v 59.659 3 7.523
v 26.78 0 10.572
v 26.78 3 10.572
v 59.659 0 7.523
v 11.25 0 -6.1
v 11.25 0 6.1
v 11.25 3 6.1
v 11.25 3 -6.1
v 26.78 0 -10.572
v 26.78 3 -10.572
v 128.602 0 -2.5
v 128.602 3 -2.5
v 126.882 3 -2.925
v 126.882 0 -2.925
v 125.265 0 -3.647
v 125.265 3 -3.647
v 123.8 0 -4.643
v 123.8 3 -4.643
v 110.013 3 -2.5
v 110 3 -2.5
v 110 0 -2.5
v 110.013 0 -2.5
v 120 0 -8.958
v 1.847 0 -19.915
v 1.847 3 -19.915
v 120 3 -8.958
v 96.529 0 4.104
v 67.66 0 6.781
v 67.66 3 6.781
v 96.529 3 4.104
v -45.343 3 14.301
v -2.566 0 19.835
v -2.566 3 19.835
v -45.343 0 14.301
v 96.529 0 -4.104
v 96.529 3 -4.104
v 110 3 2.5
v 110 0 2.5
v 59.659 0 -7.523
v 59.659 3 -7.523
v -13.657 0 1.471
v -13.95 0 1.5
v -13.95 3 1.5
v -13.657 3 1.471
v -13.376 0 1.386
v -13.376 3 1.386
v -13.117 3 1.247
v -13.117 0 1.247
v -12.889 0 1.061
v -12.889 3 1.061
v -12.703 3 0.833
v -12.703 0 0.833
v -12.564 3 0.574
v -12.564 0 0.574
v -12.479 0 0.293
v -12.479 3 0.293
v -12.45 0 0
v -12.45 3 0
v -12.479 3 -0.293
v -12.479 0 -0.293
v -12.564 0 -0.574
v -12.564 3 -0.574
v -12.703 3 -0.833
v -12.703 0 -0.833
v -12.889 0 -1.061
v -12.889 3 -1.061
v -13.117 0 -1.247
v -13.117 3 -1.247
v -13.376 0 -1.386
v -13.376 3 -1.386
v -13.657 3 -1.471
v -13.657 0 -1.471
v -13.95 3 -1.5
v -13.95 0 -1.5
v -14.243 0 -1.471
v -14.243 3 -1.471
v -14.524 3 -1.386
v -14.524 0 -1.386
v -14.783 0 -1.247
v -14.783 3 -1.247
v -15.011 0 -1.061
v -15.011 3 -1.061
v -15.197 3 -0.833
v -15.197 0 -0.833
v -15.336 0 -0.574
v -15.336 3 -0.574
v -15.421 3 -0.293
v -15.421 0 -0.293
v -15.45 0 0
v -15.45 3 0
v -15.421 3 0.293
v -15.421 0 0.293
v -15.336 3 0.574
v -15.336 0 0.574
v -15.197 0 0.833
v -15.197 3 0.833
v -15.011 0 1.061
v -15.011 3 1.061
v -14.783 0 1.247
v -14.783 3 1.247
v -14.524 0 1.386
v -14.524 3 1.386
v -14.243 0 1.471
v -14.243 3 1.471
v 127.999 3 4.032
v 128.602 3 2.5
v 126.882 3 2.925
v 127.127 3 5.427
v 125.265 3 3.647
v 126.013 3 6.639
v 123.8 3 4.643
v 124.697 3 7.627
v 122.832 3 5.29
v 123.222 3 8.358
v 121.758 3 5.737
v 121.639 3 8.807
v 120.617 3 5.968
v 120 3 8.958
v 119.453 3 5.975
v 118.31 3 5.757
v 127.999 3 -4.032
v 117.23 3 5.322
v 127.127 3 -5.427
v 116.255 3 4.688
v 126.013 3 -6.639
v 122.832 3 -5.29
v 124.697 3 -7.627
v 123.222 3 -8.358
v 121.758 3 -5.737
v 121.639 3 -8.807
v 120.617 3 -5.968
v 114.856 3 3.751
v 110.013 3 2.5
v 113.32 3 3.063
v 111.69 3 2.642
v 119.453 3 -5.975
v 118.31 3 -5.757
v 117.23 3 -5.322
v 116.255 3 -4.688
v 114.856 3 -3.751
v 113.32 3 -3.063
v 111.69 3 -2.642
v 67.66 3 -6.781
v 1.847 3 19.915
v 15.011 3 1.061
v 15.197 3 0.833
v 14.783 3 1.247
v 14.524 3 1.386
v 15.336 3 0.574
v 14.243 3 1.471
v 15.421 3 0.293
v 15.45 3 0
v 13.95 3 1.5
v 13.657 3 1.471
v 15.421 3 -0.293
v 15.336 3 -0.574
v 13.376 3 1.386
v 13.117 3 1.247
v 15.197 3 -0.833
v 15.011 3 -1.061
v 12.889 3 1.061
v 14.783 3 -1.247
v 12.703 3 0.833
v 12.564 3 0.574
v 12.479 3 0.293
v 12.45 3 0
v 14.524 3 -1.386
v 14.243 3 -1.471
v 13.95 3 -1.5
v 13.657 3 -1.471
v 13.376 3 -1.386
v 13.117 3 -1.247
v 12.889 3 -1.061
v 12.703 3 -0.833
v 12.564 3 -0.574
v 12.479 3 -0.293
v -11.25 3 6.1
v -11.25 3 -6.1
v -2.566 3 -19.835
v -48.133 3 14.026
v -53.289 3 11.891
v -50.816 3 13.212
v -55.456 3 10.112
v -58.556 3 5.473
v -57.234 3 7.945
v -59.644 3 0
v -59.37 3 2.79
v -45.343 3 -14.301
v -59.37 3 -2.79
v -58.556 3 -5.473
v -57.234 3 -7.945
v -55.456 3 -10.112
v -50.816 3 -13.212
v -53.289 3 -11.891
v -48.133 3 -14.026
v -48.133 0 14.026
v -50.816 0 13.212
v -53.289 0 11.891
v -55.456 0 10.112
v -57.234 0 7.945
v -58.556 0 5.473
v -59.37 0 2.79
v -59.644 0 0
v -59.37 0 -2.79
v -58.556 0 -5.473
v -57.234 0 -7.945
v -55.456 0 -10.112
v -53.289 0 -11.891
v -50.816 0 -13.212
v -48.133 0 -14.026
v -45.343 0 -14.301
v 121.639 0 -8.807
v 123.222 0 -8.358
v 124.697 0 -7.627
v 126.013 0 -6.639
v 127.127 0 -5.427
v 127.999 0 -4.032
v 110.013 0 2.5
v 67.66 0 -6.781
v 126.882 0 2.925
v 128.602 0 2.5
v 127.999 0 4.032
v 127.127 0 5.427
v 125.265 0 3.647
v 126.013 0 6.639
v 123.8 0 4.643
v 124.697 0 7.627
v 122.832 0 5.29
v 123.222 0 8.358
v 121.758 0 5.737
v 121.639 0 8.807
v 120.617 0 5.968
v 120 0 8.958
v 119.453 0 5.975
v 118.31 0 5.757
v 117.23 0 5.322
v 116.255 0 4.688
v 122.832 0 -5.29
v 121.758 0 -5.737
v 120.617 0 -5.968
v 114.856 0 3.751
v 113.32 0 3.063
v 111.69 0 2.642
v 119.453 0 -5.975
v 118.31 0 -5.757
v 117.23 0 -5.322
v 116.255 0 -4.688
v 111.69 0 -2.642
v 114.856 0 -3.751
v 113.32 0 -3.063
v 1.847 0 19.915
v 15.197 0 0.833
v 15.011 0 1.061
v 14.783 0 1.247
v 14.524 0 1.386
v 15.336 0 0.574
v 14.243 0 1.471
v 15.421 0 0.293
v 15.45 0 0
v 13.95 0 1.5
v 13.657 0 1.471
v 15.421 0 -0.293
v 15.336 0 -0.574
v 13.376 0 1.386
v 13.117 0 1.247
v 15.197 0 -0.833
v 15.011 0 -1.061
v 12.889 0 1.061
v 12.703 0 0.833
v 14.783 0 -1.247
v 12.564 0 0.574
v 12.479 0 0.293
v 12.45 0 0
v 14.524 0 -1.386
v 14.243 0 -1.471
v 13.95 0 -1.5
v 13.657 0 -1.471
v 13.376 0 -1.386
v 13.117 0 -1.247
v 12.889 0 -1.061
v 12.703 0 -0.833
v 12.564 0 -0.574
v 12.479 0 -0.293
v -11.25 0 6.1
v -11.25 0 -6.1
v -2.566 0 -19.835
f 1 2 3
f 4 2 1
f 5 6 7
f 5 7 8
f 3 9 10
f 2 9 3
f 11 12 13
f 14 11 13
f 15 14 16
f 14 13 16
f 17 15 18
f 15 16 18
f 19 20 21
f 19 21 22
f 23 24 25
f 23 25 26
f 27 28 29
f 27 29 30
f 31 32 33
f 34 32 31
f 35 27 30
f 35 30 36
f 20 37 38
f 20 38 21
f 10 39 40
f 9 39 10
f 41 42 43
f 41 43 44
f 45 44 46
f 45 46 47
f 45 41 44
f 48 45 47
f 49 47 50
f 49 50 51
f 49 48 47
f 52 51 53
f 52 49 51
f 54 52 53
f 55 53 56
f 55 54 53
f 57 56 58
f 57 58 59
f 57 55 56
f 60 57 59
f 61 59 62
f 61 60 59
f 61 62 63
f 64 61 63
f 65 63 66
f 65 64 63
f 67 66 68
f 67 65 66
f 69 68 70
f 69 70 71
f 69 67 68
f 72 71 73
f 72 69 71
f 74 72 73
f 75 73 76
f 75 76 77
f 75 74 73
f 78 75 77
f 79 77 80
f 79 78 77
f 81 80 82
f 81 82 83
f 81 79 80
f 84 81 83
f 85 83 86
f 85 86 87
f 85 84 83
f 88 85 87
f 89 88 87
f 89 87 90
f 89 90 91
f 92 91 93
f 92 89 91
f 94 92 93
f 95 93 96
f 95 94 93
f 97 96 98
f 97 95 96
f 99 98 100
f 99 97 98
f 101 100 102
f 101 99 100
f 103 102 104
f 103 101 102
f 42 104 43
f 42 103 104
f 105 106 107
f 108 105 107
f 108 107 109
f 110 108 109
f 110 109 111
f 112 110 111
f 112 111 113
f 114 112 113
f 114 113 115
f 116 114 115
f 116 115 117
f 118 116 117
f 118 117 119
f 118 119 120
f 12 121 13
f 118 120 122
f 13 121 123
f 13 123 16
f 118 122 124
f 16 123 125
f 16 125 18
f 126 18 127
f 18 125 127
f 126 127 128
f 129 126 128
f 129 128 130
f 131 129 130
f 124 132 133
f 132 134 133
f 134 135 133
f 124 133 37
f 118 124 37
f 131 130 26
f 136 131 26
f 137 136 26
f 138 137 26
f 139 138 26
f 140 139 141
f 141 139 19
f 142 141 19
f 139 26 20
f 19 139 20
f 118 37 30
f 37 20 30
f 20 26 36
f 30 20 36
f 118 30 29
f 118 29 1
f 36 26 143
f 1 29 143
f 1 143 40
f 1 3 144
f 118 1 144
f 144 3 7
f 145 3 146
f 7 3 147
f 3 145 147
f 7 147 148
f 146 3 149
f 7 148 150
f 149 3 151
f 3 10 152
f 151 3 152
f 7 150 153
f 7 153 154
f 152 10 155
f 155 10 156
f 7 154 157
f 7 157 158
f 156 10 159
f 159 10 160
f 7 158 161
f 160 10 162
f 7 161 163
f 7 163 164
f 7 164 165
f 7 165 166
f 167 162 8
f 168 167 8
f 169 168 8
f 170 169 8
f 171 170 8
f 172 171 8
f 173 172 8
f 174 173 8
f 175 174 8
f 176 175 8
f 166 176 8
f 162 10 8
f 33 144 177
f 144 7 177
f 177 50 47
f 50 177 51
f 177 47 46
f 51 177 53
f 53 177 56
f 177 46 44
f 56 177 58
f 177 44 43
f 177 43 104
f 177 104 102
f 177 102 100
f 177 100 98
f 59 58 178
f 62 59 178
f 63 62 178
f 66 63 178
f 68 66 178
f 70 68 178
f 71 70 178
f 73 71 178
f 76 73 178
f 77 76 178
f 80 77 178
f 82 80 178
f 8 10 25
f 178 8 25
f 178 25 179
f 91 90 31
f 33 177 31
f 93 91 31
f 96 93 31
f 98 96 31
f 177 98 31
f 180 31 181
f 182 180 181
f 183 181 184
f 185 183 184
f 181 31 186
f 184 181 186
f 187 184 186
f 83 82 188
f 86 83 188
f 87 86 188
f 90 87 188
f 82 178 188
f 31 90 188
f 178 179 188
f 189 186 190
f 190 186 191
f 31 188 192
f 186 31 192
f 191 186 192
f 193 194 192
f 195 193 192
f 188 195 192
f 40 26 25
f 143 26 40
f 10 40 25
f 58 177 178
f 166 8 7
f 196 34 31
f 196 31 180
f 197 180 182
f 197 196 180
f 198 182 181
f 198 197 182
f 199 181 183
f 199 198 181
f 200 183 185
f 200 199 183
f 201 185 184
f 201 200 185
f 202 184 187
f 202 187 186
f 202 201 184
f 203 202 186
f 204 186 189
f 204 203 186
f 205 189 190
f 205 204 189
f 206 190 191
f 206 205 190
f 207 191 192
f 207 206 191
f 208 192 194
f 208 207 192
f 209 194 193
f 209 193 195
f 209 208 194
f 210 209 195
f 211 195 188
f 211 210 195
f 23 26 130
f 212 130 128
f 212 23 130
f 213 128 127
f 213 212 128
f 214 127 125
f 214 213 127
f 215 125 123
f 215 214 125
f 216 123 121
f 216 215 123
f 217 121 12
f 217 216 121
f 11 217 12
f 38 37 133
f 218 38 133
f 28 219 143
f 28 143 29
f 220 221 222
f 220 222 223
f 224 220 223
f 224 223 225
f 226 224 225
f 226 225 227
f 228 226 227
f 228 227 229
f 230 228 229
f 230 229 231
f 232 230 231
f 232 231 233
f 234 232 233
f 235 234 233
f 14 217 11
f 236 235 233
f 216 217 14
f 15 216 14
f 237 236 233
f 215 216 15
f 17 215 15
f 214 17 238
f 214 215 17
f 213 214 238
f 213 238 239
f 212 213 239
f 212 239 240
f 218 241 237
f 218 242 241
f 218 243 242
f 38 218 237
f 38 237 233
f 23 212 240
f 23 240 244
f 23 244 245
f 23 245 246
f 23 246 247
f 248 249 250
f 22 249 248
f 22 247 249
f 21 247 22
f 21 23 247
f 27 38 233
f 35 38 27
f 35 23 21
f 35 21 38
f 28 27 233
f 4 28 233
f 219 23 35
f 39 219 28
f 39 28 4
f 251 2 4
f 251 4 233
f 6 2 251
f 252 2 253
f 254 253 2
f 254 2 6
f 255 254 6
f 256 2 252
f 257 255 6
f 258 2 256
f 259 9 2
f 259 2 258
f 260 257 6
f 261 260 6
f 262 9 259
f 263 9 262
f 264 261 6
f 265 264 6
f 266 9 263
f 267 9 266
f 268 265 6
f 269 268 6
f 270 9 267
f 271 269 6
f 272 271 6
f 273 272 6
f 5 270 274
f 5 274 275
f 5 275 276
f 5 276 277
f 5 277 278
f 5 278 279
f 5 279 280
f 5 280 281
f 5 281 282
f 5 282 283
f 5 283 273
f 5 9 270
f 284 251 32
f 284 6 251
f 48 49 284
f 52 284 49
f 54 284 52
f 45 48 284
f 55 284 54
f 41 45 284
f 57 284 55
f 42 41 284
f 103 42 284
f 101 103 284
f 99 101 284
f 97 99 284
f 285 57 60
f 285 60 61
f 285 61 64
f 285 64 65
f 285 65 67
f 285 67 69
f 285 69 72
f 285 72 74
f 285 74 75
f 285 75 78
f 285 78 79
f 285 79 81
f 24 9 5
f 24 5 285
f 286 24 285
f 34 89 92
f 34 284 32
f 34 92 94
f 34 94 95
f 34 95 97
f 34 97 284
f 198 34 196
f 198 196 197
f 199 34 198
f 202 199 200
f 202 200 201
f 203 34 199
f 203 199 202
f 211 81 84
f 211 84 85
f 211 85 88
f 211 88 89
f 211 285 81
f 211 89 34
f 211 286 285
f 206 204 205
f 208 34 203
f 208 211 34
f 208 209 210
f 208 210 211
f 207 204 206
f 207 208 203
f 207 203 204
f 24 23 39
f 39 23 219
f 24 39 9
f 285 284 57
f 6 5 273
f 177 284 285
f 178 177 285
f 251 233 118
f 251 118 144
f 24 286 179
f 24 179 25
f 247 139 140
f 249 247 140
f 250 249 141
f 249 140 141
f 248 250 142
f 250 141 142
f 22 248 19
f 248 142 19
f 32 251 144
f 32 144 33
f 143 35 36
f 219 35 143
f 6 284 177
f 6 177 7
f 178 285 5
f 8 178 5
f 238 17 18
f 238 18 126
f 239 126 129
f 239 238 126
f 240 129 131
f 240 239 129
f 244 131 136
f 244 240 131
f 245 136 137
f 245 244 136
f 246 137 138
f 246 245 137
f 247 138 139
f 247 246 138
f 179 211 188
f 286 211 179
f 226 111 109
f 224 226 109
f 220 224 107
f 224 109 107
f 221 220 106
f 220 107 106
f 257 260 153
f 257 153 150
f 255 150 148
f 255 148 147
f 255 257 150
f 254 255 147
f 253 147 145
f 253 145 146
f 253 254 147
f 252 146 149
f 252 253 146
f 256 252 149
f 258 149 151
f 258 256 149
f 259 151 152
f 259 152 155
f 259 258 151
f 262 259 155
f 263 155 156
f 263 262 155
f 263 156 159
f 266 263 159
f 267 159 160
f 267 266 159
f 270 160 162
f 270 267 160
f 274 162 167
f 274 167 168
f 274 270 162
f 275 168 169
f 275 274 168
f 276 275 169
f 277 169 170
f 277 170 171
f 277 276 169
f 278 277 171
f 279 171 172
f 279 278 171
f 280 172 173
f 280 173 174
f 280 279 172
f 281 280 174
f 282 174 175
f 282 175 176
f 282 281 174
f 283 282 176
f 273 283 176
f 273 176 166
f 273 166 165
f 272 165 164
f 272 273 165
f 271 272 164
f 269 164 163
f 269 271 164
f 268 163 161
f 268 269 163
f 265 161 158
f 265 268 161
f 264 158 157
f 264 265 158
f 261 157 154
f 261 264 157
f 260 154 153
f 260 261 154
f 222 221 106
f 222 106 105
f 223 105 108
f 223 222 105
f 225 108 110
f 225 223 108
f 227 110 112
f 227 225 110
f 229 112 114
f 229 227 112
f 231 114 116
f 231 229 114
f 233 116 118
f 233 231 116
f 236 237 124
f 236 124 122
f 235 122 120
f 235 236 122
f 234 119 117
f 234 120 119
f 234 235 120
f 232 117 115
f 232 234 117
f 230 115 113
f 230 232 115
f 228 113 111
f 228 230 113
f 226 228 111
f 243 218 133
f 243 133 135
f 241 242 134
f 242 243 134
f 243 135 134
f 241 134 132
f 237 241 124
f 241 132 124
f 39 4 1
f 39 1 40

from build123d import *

# Parameters (mm, degrees)
SKETCH1_R           = 1.5
SKETCH1_R_2         = 6
SKETCH1_W           = 22.5
SKETCH1_H           = 12.2
BOSS_EXTRUDE1_DEPTH = 3
SKETCH3_W           = 20
SKETCH3_H           = 5
CUT_EXTRUDE1_DEPTH  = 131.520857309
FILLET1_R           = 10


with BuildPart() as part:
    # Sketch1 → Boss-Extrude1 (new body)
    with BuildSketch(Plane(origin=(0, 0, 0), x_dir=(1, 0, 0), z_dir=(0, 1, 0))):
        with BuildLine():
            Line((1.846751087, 19.91455524), (120, 8.957763171))
            ThreePointArc((120, 8.957763171), (128.957763171, 0), (120, -8.957763171))
            Line((120, -8.957763171), (1.846751087, -19.91455524))
            Line((1.846751087, -19.91455524), (-2.565887989, -19.834722555))
            Line((-2.565887989, -19.834722555), (-45.343490518, -14.300864634))
            ThreePointArc((-45.343490518, -14.300864634), (-59.644355152, 0), (-45.343490518, 14.300864634))
            Line((-45.343490518, 14.300864634), (-2.565887989, 19.834722555))
            Line((-2.565887989, 19.834722555), (1.846751087, 19.91455524))
        make_face()
        with Locations(Location((13.95, 0, 0), (0, 0, 270))):
            Circle(SKETCH1_R, mode=Mode.SUBTRACT)
        with Locations(Location((-13.95, 0, 0), (0, 0, 270))):
            Circle(SKETCH1_R, mode=Mode.SUBTRACT)
        with Locations(Location((120, 0, 0), (0, 0, 270))):
            Circle(SKETCH1_R_2, mode=Mode.SUBTRACT)
        Rectangle(SKETCH1_W, SKETCH1_H, mode=Mode.SUBTRACT)
        Polygon((96.529167285, 4.104267173), (67.660347399, 6.781380665), (67.660347399, -6.781380665), (96.529167285, -4.104267173), align=None, mode=Mode.SUBTRACT)
        Polygon((59.65913304, 7.523363157), (26.779600723, 10.572404992), (26.779600723, -10.572404992), (59.65913304, -7.523363157), align=None, mode=Mode.SUBTRACT)
    extrude(amount=BOSS_EXTRUDE1_DEPTH)

    # Sketch3 → Cut-Extrude1 (cut, through all)
    with BuildSketch(Plane(origin=(0, 3, 0), x_dir=(1, 0, 0), z_dir=(0, 1, 0))):
        with Locations((120, 0)):
            Rectangle(SKETCH3_W, SKETCH3_H)
    extrude(amount=-CUT_EXTRUDE1_DEPTH, mode=Mode.SUBTRACT)

    # Fillet1
    # the kernel refuses this fillet: 10 mm, written as the material it takes off along each edge
    with BuildSketch(Plane(origin=(125.454356057, 10.868690914, 2.5), x_dir=(1, 0, 0), z_dir=(0, -1, 0))) as fillet1_piece_1:
        with BuildLine():
            CenterArc((4.679032278, 9.882020871), FILLET1_R, 230.703265247, 30.48689252)
            Line((-1.654335431, 2.143257826), (-1.781002786, 1.988482566))
            ThreePointArc((-1.781002786, 1.988482566), (-0.863019038, 1.043956035), (-0.181811869, -0.083333333))
            Line((-0.181811869, -0.083333333), (0, -0.2))
            ThreePointArc((0, -0.2), (1.573738183, -0.2), (3.116845247, -0.197640417))
            Line((3.116845247, -0.197640417), (3.147476366, 0))
        make_face()
    extrude(amount=18.737381828, mode=Mode.SUBTRACT)
    with BuildSketch(Plane(origin=(114.545643943, 14.332840301, 2.5), x_dir=(0.6156579371182371, 0, 0.7880135179445317), z_dir=(0, -1, 0))) as fillet1_piece_2:
        with BuildLine():
            CenterArc((5.089273947, 9.728751913), FILLET1_R, 217.99974274, 38.624832873)
            Line((-2.790861233, 3.572172542), (-2.948463936, 3.449040954))
            Line((-2.948463936, 3.449040954), (-0.157602704, -0.123131587))
            Line((-0.157602704, -0.123131587), (0.046266127, -0.194575038))
            ThreePointArc((0.046266127, -0.194575038), (1.387983804, -0.037251148), (2.729701481, -0.194575038))
            Line((2.729701481, -0.194575038), (2.775967607, 0))
        make_face()
    extrude(amount=25.665680602, mode=Mode.SUBTRACT)
    with BuildSketch(Plane(origin=(114.545643943, 14.332840301, -2.5), x_dir=(-1, 0, 0), z_dir=(0, -1, 0))) as fillet1_piece_3:
        with BuildLine():
            CenterArc((4.53313612, 10), FILLET1_R, 231.375167127, 38.624832873)
            Line((-1.709046491, 2.1875), (-1.833890143, 2.03125))
            ThreePointArc((-1.833890143, 2.03125), (-0.883877653, 1.070816035), (-0.181811869, -0.083333333))
            Line((-0.181811869, -0.083333333), (0, -0.2))
            Line((0, -0.2), (4.53313612, -0.2))
            Line((4.53313612, -0.2), (4.53313612, 0))
        make_face()
    extrude(amount=25.665680602, mode=Mode.SUBTRACT)
    with BuildSketch(Plane(origin=(125.454356057, 10.868690914, -2.5), x_dir=(-0.6110269025667731, 0, -0.7916098308760795), z_dir=(0, -1, 0))) as fillet1_piece_4:
        with BuildLine():
            CenterArc((4.96369027, 9.742148554), FILLET1_R, 226.473634032, 30.48689252)
            Line((-1.923192735, 2.491573233), (-2.060930395, 2.346561727))
            ThreePointArc((-2.060930395, 2.346561727), (-1.119918333, 1.123581236), (-0.158321966, -0.122205381))
            Line((-0.158321966, -0.122205381), (0.045124457, -0.194842971))
            ThreePointArc((0.045124457, -0.194842971), (1.35373371, -0.045289132), (2.662342963, -0.194842971))
            Line((2.662342963, -0.194842971), (2.70746742, 0))
        make_face()
    extrude(amount=18.737381828, mode=Mode.SUBTRACT)


solid = part.part
